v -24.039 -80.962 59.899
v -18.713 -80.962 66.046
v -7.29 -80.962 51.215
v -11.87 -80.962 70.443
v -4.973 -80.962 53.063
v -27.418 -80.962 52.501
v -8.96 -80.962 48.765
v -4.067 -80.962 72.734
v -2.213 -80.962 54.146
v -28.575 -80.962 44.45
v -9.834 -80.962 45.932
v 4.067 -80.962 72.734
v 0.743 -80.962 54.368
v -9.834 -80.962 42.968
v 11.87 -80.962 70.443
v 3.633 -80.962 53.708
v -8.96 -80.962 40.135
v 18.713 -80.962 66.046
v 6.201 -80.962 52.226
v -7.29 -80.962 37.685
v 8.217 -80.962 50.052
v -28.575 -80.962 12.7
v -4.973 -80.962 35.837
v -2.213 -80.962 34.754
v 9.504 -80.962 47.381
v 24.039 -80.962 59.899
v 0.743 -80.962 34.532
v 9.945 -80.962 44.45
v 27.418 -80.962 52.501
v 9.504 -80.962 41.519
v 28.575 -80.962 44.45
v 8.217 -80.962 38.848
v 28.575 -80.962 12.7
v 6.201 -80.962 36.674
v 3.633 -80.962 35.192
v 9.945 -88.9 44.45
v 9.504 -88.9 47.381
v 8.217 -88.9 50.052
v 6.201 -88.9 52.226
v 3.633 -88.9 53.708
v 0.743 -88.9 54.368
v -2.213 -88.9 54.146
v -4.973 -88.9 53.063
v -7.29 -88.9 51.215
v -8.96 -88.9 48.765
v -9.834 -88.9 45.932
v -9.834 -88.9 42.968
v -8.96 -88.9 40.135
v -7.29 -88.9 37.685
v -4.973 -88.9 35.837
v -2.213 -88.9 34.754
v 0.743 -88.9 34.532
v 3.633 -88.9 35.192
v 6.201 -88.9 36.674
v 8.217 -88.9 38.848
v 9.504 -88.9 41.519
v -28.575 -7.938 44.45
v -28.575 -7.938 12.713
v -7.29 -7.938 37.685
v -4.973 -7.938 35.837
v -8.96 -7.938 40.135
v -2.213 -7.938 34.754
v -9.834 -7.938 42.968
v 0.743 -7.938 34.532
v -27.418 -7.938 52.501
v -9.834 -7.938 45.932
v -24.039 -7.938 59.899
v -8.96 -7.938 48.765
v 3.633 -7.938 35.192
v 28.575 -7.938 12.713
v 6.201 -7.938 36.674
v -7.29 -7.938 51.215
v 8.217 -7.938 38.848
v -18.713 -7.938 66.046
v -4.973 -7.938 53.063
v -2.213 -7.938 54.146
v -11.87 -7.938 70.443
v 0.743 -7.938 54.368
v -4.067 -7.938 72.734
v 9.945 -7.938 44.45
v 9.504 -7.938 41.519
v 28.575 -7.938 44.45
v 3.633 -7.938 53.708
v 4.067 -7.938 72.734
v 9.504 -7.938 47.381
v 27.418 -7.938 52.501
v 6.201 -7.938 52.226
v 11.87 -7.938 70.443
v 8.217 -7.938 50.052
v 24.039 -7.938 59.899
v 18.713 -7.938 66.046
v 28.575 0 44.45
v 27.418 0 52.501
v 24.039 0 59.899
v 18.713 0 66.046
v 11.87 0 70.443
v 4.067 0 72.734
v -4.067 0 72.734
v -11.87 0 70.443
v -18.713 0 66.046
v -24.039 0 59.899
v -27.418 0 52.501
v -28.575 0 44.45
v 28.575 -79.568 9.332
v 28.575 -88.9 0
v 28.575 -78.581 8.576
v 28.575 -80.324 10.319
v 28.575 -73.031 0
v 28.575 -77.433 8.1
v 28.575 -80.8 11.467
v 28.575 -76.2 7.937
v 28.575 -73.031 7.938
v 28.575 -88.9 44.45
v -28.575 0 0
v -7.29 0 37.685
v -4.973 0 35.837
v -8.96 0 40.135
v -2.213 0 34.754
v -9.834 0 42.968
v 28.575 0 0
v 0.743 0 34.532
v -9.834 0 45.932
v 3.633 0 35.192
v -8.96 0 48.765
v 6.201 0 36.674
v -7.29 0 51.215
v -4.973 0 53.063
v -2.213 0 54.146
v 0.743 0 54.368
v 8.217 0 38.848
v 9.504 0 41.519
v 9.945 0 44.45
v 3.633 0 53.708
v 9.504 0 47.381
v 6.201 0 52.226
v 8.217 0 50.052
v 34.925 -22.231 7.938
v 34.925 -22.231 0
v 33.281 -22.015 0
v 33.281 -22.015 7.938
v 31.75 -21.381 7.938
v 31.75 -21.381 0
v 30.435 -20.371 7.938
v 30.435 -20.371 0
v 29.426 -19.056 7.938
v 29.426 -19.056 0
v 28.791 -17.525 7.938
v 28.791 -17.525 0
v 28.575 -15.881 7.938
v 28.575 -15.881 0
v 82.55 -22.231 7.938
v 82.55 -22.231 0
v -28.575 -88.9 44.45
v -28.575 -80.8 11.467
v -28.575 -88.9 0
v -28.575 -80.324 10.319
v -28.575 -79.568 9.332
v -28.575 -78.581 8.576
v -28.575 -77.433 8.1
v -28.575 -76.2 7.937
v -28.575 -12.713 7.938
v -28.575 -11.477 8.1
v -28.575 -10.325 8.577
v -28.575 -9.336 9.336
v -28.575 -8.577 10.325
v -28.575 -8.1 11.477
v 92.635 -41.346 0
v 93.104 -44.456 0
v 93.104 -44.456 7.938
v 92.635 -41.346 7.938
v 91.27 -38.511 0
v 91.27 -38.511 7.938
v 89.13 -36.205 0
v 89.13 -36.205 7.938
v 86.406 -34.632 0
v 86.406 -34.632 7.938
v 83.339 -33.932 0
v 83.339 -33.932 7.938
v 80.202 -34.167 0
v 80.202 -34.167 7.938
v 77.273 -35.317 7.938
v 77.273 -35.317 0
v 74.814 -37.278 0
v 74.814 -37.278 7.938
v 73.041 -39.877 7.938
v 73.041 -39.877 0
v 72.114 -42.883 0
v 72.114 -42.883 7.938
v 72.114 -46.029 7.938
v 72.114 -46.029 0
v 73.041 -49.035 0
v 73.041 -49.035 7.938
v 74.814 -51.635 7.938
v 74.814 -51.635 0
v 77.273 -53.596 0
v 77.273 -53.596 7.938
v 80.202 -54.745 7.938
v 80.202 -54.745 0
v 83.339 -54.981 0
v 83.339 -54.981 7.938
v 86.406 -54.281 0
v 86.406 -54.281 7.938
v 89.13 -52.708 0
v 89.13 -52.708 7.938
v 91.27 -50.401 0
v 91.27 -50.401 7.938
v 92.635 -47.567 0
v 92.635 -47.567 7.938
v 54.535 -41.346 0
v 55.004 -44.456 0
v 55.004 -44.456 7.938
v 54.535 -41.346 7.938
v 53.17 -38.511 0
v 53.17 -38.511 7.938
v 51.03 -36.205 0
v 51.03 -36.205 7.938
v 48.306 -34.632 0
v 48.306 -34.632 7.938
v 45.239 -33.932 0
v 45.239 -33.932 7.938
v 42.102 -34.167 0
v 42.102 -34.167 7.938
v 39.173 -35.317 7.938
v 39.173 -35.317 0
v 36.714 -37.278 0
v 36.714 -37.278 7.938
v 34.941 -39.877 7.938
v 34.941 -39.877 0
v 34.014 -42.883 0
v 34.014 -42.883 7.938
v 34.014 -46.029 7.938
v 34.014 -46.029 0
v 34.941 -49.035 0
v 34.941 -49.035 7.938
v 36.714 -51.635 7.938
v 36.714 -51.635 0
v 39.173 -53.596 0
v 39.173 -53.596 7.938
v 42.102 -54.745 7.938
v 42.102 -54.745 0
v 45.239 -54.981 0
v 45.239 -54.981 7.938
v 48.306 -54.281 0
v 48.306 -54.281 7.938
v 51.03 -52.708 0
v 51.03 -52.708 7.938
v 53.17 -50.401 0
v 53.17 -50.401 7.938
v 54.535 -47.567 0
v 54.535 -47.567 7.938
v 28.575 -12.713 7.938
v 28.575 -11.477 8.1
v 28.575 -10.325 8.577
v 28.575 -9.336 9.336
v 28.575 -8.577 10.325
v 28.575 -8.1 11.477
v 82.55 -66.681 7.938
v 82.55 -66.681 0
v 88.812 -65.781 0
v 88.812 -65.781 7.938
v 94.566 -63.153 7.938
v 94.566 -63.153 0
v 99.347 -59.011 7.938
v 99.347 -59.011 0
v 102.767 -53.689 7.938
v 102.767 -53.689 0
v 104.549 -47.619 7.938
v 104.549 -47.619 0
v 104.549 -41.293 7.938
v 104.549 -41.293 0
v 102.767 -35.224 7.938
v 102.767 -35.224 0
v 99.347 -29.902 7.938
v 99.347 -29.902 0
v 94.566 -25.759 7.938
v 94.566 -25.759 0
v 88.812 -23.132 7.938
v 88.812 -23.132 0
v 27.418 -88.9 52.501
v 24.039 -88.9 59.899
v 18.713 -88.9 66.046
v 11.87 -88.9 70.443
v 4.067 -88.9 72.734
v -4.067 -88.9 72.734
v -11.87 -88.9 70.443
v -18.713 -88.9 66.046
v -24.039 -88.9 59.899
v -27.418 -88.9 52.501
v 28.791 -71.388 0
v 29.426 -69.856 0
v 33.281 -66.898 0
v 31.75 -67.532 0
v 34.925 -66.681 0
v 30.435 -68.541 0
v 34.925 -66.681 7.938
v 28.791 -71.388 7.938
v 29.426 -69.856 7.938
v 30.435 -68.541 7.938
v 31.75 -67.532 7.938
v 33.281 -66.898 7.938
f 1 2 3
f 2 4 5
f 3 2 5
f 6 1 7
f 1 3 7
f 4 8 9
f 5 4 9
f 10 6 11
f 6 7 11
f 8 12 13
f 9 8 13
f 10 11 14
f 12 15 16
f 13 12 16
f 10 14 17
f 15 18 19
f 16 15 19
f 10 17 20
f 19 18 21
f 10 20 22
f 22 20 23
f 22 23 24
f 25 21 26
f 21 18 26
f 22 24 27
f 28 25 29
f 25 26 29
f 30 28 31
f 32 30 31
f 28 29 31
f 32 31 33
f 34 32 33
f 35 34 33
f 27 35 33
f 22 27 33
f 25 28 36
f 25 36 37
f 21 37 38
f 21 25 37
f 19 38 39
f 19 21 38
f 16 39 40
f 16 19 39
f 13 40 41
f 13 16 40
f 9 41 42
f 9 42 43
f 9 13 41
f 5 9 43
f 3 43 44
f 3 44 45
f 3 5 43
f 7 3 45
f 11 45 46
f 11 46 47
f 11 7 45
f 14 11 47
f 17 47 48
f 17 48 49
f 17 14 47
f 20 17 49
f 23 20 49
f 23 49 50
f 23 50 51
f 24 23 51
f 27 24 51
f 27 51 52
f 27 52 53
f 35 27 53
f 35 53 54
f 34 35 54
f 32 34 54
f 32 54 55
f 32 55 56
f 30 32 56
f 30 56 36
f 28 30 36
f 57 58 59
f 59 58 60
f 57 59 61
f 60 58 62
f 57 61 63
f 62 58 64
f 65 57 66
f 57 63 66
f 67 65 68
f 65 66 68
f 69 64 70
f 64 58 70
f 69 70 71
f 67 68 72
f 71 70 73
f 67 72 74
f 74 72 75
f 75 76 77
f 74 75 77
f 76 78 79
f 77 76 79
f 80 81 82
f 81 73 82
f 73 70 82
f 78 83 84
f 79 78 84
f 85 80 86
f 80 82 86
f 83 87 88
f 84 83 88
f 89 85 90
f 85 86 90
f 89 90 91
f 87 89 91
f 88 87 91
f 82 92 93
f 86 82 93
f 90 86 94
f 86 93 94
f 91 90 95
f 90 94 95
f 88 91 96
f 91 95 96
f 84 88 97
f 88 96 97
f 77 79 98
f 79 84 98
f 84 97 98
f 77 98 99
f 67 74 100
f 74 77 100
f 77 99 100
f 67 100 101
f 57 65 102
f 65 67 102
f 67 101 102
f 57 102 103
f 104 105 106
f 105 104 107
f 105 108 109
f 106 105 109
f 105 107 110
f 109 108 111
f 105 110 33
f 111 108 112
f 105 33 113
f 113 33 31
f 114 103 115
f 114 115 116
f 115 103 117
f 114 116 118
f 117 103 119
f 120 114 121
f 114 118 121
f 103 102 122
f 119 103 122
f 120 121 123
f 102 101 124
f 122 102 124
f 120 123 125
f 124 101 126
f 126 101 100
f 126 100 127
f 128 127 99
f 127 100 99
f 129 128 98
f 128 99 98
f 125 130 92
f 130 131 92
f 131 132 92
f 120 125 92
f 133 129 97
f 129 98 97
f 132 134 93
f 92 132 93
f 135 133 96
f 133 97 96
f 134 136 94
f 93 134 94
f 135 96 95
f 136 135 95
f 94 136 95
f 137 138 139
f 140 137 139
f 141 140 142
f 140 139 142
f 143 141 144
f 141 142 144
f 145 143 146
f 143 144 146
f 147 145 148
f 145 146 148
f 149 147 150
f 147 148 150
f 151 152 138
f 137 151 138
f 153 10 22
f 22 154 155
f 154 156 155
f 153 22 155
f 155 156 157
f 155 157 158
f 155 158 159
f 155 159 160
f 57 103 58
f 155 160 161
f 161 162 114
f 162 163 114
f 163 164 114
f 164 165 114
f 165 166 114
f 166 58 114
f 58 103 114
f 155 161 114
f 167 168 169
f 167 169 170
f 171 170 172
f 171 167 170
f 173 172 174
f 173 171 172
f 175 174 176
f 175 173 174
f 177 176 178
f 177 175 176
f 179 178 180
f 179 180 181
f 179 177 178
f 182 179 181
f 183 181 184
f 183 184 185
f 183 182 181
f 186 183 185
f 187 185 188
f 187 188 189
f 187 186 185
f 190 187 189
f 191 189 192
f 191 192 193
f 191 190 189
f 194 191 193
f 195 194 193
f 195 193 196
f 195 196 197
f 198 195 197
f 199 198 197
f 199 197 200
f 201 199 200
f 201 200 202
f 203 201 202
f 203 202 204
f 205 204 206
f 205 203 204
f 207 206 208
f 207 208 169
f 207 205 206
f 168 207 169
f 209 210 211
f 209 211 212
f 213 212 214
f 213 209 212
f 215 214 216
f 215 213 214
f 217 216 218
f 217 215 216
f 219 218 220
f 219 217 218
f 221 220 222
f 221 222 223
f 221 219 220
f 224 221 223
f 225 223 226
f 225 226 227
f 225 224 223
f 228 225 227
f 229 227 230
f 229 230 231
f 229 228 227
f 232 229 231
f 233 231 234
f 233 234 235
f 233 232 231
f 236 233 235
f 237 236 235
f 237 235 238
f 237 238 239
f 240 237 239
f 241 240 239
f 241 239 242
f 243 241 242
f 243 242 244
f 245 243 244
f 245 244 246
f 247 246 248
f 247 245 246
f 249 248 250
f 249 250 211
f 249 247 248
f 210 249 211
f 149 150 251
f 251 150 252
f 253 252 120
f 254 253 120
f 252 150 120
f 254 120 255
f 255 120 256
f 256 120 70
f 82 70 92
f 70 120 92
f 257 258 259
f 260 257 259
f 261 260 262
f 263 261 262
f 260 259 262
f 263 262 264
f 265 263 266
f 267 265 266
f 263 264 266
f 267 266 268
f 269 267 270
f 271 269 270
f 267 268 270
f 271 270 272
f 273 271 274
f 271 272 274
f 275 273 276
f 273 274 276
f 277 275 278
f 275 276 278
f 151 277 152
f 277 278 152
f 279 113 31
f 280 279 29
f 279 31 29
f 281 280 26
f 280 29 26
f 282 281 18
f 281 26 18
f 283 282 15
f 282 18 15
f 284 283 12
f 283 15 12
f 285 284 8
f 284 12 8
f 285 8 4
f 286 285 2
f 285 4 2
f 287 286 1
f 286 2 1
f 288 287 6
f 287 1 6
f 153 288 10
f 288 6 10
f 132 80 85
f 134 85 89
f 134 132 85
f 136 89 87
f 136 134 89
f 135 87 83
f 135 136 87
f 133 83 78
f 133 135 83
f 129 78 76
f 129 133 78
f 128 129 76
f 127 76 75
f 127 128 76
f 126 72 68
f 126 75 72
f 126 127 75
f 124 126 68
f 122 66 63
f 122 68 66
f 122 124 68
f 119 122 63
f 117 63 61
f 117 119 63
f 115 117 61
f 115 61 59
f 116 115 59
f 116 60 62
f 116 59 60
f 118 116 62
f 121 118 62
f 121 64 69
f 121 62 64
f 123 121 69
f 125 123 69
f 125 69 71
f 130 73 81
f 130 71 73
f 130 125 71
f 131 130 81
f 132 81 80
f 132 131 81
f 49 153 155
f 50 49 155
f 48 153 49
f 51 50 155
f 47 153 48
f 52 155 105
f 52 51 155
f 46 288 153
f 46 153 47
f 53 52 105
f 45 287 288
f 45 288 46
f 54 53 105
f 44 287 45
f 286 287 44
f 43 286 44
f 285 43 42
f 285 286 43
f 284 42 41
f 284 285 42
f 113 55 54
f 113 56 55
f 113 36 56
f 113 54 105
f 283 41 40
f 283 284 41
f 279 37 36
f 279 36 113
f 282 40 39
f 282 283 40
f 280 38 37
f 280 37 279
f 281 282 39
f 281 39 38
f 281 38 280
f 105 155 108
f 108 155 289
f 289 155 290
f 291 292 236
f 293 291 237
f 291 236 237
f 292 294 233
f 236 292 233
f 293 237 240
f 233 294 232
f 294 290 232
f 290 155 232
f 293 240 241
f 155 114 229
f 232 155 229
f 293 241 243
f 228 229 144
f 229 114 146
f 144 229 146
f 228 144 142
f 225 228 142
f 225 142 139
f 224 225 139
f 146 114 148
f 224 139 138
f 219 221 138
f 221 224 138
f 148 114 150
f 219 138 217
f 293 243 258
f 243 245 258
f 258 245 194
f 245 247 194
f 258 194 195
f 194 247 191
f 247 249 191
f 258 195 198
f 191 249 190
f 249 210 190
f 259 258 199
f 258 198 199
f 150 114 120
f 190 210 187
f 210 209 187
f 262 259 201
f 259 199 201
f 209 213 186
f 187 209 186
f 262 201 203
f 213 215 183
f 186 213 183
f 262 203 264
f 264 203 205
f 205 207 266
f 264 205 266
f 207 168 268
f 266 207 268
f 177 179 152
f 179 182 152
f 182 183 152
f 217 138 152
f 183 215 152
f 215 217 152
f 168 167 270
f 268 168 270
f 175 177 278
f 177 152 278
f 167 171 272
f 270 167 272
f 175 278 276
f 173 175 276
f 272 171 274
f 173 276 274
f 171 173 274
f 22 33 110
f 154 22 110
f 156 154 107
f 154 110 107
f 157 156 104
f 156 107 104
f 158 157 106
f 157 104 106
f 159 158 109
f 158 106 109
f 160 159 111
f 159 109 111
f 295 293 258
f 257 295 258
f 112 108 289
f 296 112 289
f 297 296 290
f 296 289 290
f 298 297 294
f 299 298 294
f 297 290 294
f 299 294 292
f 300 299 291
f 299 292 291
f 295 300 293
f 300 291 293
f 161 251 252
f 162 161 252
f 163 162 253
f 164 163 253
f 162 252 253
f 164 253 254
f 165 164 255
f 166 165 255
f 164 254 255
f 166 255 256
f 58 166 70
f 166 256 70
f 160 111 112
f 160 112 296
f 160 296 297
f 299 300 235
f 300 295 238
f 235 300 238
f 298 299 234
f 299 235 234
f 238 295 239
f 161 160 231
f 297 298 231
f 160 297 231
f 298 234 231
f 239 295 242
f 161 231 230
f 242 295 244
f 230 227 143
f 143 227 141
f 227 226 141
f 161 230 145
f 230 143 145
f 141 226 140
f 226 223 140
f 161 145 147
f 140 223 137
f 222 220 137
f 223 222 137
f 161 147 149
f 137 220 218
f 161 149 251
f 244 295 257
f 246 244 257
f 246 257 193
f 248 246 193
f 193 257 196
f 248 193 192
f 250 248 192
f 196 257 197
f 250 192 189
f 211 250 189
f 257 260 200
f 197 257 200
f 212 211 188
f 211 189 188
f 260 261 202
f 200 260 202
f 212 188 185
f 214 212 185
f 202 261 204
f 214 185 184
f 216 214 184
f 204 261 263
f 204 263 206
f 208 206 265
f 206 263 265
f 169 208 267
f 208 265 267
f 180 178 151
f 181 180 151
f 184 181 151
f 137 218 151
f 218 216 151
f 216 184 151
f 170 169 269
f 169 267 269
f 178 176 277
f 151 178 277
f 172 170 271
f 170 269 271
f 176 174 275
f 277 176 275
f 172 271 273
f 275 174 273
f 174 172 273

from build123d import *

# Parameters (mm, degrees)
F0_R     = 9.94537
F1_DEPTH = 88.9
F3_DEPTH = 57.151
F4_R     = 10.5537
F5_DEPTH = 7.9375


with BuildPart() as f1:
    # F0 (on Front) → F1 (new body)
    with BuildSketch(Plane.XZ):
        with BuildLine():
            Line((28.575, 0), (28.575, 44.45))
            ThreePointArc((28.575, 44.45), (0, 73.025), (-28.575, 44.45))
            Line((-28.575, 44.45), (-28.575, 0))
            Line((-28.575, 0), (28.575, 0))
        make_face()
        with Locations((0, 44.45)):
            Circle(F0_R, mode=Mode.SUBTRACT)
    extrude(amount=F1_DEPTH)

    # F2 (on face) → F3 (cut, through all)
    with BuildSketch(Plane.YZ.offset(28.575)):
        with BuildLine():
            Line((-7.9375, 77.544321), (-80.9625, 77.544321))
            Line((-80.9625, 77.544321), (-80.9625, 12.7))
            ThreePointArc((-80.9625, 12.7), (-79.567596, 9.332404), (-76.2, 7.9375))
            Line((-76.2, 7.9375), (-12.7127, 7.9375))
            ThreePointArc((-12.7127, 7.9375), (-9.336124, 9.336124), (-7.9375, 12.7127))
            Line((-7.9375, 12.7127), (-7.9375, 77.544321))
        make_face()
    extrude(amount=-F3_DEPTH, mode=Mode.SUBTRACT)

    # F4 (on Top) → F5 (join)
    with BuildSketch(Plane.XY):
        with BuildLine():
            ThreePointArc((34.925, -22.23135), (30.434872, -20.371478), (28.575, -15.88135))
            Line((28.575, -15.88135), (28.575, -73.03135))
            ThreePointArc((28.575, -73.03135), (30.434872, -68.541222), (34.925, -66.68135))
            Line((34.925, -66.68135), (82.55, -66.68135))
            ThreePointArc((82.55, -66.68135), (104.775, -44.45635), (82.55, -22.23135))
            Line((82.55, -22.23135), (34.925, -22.23135))
        make_face()
        with Locations((44.45, -44.45635)):
            Circle(F4_R, mode=Mode.SUBTRACT)
        with Locations((82.55, -44.45635)):
            Circle(F4_R, mode=Mode.SUBTRACT)
    extrude(amount=F5_DEPTH)


solid = f1.part
